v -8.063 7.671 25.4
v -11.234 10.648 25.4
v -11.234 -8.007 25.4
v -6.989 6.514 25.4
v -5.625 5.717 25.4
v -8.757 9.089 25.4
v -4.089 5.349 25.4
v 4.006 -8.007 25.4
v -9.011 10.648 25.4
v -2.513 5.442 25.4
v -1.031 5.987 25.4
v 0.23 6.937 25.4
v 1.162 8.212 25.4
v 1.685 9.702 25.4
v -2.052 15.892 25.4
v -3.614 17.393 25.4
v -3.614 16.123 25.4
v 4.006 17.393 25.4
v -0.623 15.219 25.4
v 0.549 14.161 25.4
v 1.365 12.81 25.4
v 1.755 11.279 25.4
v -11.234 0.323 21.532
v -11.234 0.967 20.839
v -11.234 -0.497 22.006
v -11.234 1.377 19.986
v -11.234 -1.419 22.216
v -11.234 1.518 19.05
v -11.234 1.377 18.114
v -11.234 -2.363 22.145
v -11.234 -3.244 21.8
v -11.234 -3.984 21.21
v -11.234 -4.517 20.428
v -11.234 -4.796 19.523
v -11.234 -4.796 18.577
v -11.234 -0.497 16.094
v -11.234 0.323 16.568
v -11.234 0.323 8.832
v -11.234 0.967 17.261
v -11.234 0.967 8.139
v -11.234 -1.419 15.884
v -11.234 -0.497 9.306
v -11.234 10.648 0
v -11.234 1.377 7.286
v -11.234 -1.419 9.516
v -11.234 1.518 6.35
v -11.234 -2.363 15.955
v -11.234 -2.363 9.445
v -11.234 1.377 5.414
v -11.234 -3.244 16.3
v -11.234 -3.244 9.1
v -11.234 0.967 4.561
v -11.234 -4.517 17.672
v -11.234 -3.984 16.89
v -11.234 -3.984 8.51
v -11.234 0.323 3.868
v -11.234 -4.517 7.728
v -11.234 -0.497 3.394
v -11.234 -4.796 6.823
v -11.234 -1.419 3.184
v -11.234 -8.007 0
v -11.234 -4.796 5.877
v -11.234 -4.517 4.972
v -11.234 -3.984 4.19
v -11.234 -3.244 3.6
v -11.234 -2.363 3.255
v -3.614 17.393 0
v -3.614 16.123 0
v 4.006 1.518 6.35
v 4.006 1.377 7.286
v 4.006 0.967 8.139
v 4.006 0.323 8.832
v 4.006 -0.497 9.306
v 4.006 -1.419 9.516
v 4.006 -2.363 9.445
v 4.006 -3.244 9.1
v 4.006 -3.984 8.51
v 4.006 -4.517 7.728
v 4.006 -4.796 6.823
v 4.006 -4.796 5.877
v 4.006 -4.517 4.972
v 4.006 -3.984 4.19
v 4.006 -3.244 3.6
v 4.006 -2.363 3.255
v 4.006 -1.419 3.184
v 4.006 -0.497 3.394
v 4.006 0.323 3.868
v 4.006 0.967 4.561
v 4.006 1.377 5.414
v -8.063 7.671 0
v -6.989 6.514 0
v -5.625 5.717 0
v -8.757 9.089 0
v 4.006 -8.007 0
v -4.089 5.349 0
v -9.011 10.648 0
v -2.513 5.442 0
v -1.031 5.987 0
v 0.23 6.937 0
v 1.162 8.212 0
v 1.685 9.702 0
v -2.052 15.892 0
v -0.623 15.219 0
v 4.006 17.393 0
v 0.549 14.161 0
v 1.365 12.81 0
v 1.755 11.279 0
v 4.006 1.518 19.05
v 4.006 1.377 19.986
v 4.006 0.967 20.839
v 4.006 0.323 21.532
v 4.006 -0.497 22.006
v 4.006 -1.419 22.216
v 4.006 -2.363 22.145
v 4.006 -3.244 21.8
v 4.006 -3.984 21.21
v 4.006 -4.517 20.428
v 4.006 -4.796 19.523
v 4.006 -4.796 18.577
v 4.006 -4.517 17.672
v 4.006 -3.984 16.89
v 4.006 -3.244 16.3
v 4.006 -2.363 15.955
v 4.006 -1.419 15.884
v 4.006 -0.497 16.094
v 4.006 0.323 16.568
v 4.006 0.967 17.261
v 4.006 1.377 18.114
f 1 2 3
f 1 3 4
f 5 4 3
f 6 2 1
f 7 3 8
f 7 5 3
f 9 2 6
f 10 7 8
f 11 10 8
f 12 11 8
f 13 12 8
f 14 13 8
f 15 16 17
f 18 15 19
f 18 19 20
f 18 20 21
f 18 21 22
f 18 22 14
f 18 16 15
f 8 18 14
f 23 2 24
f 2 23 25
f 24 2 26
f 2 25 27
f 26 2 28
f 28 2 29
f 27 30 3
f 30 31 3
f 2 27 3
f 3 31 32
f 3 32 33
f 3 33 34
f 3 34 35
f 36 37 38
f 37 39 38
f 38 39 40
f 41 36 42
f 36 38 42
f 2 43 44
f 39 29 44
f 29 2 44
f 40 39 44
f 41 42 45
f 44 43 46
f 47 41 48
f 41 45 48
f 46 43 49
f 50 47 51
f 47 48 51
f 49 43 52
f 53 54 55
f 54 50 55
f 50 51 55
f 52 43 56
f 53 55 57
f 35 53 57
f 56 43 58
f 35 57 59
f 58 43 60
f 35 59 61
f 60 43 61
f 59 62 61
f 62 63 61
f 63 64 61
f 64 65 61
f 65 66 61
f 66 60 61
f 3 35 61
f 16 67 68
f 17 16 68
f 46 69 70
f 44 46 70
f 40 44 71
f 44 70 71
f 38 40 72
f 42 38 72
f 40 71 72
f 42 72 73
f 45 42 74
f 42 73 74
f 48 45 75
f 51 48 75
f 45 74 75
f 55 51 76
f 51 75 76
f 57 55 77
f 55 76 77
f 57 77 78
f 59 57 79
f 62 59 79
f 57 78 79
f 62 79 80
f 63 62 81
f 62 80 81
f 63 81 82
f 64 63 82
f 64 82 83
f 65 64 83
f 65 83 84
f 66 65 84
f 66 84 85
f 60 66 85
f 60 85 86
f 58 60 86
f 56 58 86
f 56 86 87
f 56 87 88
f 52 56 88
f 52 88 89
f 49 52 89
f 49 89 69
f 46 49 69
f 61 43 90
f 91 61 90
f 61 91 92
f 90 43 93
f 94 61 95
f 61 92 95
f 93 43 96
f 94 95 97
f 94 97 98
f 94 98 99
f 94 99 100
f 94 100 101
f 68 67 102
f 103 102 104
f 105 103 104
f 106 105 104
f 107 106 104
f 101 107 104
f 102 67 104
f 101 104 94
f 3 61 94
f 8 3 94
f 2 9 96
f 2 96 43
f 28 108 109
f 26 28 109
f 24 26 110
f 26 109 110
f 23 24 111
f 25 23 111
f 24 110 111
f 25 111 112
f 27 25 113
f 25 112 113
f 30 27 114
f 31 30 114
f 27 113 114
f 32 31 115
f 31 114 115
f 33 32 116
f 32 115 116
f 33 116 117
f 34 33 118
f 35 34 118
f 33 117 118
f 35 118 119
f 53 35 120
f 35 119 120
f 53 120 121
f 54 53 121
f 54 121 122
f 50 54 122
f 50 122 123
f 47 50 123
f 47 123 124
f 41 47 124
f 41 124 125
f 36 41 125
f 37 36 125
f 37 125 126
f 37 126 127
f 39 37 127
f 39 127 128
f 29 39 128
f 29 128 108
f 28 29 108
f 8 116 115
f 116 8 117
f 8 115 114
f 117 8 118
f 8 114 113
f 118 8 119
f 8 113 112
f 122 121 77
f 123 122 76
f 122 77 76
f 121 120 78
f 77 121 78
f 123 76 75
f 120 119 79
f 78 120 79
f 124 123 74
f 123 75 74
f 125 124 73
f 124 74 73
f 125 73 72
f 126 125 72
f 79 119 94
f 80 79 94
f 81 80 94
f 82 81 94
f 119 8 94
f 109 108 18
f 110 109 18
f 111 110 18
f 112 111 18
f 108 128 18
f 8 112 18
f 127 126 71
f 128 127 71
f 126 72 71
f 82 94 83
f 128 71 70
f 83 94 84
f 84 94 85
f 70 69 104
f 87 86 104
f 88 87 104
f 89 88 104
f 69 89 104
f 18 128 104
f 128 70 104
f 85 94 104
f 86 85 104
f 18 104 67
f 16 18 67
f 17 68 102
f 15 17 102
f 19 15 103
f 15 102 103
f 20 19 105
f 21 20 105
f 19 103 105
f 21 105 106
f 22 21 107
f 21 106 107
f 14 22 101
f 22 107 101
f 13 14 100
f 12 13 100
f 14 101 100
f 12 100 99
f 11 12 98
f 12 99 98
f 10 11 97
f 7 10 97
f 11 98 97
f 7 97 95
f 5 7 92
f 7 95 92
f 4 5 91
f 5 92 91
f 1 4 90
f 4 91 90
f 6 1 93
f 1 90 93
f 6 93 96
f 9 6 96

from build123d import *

# Parameters (mm, degrees)
BOSS_EXTRUDE1_DEPTH = 25.4
SKETCH2_R           = 3.175
CUT_EXTRUDE1_DEPTH  = 25.4


with BuildPart() as part:
    # Sketch1 → Boss-Extrude1 (new body)
    with BuildSketch(Plane.XY):
        with BuildLine():
            Line((-9.010920048, 10.647675717), (-11.233987821, 10.647675717))
            Line((-11.233987821, 10.647675717), (-11.233987821, -8.006537715))
            Line((-11.233987821, -8.006537715), (4.006012179, -8.006537715))
            Line((4.006012179, -8.006537715), (4.006012179, 17.393462285))
            Line((4.006012179, 17.393462285), (-3.613987821, 17.393462285))
            Line((-3.613987821, 17.393462285), (-3.613987821, 16.123462285))
            ThreePointArc((-3.613987821, 16.123462285), (0.23019987, 6.937133014), (-9.010920048, 10.647675717))
        make_face()
    extrude(amount=BOSS_EXTRUDE1_DEPTH)

    # Sketch2 → Cut-Extrude1 (cut)
    with BuildSketch(Plane(origin=(4.006012179, 0, 0), x_dir=(0, 0, -1), z_dir=(1, 0, 0))):
        with Locations(Location((-19.05, -1.656537715, 0), (0, 0, 90))):
            Circle(SKETCH2_R)
        with Locations(Location((-6.35, -1.656537715, 0), (0, 0, 90))):
            Circle(SKETCH2_R)
    extrude(amount=-CUT_EXTRUDE1_DEPTH, mode=Mode.SUBTRACT)


solid = part.part
